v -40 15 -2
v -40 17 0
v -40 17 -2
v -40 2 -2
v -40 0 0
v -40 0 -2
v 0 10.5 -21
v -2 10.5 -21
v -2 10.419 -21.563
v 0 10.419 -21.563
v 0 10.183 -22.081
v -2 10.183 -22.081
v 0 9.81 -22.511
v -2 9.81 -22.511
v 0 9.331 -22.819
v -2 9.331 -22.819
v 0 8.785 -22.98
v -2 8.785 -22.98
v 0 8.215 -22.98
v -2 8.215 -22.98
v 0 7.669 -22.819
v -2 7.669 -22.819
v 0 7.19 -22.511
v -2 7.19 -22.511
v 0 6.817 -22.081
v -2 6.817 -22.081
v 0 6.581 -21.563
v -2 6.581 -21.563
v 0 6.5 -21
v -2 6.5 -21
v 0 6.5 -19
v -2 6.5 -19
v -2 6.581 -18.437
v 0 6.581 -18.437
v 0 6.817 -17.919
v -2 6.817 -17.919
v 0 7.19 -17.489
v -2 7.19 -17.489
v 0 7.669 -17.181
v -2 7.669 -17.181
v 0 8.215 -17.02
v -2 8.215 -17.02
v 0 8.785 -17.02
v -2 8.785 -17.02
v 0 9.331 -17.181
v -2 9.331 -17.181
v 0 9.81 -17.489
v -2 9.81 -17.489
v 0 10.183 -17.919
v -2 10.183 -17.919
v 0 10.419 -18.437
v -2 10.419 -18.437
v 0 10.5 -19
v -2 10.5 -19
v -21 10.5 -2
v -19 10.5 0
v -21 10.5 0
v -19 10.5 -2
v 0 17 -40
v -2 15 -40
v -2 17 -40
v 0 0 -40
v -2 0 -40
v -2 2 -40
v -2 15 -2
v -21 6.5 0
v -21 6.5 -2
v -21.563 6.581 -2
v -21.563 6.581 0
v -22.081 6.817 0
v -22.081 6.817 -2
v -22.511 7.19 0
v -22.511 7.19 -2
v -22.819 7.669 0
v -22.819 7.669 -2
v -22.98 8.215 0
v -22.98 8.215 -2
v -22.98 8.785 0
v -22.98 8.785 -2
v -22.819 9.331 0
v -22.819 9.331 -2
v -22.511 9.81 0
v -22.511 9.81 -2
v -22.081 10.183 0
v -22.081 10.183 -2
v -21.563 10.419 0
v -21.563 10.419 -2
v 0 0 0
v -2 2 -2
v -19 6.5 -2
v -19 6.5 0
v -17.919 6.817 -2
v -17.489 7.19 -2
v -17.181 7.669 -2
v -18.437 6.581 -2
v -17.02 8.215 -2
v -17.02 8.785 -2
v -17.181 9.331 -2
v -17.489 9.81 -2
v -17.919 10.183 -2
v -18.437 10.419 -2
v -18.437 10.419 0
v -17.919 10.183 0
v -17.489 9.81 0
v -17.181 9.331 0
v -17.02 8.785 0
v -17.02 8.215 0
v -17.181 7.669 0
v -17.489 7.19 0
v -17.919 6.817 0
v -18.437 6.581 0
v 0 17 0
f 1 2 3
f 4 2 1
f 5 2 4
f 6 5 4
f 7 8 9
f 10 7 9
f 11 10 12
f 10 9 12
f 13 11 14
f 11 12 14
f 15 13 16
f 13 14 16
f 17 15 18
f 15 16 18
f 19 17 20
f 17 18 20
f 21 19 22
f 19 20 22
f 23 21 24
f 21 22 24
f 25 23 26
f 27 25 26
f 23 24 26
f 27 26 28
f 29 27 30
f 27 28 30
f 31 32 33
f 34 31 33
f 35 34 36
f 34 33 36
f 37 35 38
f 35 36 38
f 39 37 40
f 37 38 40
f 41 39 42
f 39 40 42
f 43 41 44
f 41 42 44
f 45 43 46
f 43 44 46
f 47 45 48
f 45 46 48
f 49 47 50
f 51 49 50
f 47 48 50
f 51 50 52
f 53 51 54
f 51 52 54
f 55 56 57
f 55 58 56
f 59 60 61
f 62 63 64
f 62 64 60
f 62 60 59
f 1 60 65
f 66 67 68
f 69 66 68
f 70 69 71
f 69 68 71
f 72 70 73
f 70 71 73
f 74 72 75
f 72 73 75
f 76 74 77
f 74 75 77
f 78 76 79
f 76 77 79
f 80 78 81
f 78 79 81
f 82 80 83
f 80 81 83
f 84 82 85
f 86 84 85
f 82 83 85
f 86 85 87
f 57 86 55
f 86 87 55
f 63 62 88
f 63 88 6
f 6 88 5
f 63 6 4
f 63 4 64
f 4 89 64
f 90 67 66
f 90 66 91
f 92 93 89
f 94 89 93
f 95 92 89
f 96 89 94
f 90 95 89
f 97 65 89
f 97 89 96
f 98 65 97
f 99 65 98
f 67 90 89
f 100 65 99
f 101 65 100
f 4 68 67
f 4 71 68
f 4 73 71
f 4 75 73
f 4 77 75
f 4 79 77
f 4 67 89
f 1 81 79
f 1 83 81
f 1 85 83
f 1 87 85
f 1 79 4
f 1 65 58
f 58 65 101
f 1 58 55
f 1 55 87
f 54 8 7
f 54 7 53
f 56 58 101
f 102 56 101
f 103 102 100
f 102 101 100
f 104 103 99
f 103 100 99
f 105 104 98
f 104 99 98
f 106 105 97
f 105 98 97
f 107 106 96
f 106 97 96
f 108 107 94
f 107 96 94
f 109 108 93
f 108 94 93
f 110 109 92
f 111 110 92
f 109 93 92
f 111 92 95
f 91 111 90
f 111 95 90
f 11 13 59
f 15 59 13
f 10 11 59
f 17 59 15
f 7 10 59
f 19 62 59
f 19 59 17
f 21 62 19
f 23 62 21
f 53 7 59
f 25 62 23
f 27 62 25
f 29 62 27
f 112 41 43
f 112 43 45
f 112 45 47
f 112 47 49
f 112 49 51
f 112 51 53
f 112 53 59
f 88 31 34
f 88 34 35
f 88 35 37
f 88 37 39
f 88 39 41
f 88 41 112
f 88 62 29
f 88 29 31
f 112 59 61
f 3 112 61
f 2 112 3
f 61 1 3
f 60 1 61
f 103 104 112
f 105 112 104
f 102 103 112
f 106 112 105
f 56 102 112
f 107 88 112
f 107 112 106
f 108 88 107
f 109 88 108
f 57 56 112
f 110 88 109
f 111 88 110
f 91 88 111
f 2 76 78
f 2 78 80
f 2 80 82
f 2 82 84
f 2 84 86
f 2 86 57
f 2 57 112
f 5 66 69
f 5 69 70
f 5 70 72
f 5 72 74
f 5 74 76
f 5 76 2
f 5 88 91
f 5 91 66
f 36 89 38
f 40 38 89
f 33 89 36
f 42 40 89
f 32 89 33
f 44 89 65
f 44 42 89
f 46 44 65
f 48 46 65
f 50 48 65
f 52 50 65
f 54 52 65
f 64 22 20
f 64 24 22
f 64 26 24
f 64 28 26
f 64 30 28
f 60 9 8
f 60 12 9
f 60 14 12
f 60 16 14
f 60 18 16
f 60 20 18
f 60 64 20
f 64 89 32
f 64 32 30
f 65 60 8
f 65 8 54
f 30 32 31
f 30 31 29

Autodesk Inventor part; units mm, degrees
ref_plane "YZ Plane" through (0, 0, 0) normal (1, 0, 0) x (0, 1, 0)
ref_plane "XZ Plane" through (0, 0, 0) normal (0, 1, 0) x (-1, 0, 0)
ref_plane "XY Plane" through (0, 0, 0) normal (0, 0, 1) x (1, 0, 0)
sketch "Эскиз1" plane through (0, 0, 0) normal (0, 1, 0) x (-1, 0, 0)
  line L0 (0, 0) -> (40, 0)
  line L1 (40, 0) -> (40, -40)
  line L2 (40, -40) -> (0, -40)
  line L3 (0, -40) -> (0, 0)
  line L4 (40, 0) -> (40, -2)
  line L5 (0, -40) -> (2, -40)
  line L6 (40, -2) -> (2, -40)
  dimension "d0" = 40
  dimension "d1" = 40
  dimension "d2" = 2
  dimension "d3" = 2
extrude "Выдавливание1" add sketch "Эскиз1" along normal blind 17 contours L0 L1 L6 L2 L3
sketch "Эскиз2" plane through (0, 0, -40) normal (0, 0, -1) x (-1, 0, 0)
  line L0 (0, 17) -> (2, 17) projected
  line L1 (2, 17) -> (2, 15)
  line L2 (2, 0) -> (2, 17) projected
  line L3 (2, 15) -> (40, 15)
  line L4 (40, 0) -> (40, 17) projected
  line L5 (0, 0) -> (2, 0) projected
  line L6 (2, 0) -> (2, 2)
  line L7 (2, 2) -> (40, 2)
  line L8 (40, 2) -> (40, 15)
  line L9 (2, 15) -> (2, 2)
  dimension "d6" = 2
  dimension "d7" = 2
extrude "Выдавливание2" cut sketch "Эскиз2" against normal blind 38
sketch "Эскиз3" plane through (0, 0, -2) normal (0, 0, -1) x (-1, 0, 0)
  line L0 (0, 0) -> (0, 17) projected
  line L1 (20, 10.2321) -> (20, 10.5)
  line L2 (20, 10.5) -> (21, 10.5)
  line L3 (21, 6.5) -> (19, 6.5)
  line L4 (19, 10.5) -> (20, 10.5)
  arc A0 (21, 6.5) -> (21, 10.5) centre (21, 8.5) ccw
  arc A1 (19, 10.5) -> (19, 6.5) centre (19, 8.5) ccw
  line L5 (20, 10.5) -> (20, 8.5)
  line L6 (0, 8.5) -> (17, 8.5)
  line L7 (19, 8.5) -> (20, 8.5)
  dimension "d10" = 20
  dimension "d11" = 2
  dimension "d13" = 1
extrude "Выдавливание3" cut sketch "Эскиз3" against normal blind 10
sketch "Эскиз4" plane through (-2, 2, -40) normal (-1, 0, 0) x (0, 0, 1)
  line L0 (0, 0) -> (0, 13) projected
  line L1 (0, 6.5) -> (20, 6.5)
  line L2 (20, 8.2321) -> (20, 8.5)
  line L3 (20, 8.5) -> (21, 8.5)
  line L4 (21, 4.5) -> (20, 4.5)
  line L5 (20, 4.5) -> (19, 4.5)
  line L6 (19, 8.5) -> (20, 8.5)
  arc A0 (21, 4.5) -> (21, 8.5) centre (21, 6.5) ccw
  arc A1 (19, 8.5) -> (19, 4.5) centre (19, 6.5) ccw
  point P0 (40, -2)
  dimension "d17" = 20
extrude "Выдавливание5" cut sketch "Эскиз4" against normal blind 18.75
properties part number "угол"
